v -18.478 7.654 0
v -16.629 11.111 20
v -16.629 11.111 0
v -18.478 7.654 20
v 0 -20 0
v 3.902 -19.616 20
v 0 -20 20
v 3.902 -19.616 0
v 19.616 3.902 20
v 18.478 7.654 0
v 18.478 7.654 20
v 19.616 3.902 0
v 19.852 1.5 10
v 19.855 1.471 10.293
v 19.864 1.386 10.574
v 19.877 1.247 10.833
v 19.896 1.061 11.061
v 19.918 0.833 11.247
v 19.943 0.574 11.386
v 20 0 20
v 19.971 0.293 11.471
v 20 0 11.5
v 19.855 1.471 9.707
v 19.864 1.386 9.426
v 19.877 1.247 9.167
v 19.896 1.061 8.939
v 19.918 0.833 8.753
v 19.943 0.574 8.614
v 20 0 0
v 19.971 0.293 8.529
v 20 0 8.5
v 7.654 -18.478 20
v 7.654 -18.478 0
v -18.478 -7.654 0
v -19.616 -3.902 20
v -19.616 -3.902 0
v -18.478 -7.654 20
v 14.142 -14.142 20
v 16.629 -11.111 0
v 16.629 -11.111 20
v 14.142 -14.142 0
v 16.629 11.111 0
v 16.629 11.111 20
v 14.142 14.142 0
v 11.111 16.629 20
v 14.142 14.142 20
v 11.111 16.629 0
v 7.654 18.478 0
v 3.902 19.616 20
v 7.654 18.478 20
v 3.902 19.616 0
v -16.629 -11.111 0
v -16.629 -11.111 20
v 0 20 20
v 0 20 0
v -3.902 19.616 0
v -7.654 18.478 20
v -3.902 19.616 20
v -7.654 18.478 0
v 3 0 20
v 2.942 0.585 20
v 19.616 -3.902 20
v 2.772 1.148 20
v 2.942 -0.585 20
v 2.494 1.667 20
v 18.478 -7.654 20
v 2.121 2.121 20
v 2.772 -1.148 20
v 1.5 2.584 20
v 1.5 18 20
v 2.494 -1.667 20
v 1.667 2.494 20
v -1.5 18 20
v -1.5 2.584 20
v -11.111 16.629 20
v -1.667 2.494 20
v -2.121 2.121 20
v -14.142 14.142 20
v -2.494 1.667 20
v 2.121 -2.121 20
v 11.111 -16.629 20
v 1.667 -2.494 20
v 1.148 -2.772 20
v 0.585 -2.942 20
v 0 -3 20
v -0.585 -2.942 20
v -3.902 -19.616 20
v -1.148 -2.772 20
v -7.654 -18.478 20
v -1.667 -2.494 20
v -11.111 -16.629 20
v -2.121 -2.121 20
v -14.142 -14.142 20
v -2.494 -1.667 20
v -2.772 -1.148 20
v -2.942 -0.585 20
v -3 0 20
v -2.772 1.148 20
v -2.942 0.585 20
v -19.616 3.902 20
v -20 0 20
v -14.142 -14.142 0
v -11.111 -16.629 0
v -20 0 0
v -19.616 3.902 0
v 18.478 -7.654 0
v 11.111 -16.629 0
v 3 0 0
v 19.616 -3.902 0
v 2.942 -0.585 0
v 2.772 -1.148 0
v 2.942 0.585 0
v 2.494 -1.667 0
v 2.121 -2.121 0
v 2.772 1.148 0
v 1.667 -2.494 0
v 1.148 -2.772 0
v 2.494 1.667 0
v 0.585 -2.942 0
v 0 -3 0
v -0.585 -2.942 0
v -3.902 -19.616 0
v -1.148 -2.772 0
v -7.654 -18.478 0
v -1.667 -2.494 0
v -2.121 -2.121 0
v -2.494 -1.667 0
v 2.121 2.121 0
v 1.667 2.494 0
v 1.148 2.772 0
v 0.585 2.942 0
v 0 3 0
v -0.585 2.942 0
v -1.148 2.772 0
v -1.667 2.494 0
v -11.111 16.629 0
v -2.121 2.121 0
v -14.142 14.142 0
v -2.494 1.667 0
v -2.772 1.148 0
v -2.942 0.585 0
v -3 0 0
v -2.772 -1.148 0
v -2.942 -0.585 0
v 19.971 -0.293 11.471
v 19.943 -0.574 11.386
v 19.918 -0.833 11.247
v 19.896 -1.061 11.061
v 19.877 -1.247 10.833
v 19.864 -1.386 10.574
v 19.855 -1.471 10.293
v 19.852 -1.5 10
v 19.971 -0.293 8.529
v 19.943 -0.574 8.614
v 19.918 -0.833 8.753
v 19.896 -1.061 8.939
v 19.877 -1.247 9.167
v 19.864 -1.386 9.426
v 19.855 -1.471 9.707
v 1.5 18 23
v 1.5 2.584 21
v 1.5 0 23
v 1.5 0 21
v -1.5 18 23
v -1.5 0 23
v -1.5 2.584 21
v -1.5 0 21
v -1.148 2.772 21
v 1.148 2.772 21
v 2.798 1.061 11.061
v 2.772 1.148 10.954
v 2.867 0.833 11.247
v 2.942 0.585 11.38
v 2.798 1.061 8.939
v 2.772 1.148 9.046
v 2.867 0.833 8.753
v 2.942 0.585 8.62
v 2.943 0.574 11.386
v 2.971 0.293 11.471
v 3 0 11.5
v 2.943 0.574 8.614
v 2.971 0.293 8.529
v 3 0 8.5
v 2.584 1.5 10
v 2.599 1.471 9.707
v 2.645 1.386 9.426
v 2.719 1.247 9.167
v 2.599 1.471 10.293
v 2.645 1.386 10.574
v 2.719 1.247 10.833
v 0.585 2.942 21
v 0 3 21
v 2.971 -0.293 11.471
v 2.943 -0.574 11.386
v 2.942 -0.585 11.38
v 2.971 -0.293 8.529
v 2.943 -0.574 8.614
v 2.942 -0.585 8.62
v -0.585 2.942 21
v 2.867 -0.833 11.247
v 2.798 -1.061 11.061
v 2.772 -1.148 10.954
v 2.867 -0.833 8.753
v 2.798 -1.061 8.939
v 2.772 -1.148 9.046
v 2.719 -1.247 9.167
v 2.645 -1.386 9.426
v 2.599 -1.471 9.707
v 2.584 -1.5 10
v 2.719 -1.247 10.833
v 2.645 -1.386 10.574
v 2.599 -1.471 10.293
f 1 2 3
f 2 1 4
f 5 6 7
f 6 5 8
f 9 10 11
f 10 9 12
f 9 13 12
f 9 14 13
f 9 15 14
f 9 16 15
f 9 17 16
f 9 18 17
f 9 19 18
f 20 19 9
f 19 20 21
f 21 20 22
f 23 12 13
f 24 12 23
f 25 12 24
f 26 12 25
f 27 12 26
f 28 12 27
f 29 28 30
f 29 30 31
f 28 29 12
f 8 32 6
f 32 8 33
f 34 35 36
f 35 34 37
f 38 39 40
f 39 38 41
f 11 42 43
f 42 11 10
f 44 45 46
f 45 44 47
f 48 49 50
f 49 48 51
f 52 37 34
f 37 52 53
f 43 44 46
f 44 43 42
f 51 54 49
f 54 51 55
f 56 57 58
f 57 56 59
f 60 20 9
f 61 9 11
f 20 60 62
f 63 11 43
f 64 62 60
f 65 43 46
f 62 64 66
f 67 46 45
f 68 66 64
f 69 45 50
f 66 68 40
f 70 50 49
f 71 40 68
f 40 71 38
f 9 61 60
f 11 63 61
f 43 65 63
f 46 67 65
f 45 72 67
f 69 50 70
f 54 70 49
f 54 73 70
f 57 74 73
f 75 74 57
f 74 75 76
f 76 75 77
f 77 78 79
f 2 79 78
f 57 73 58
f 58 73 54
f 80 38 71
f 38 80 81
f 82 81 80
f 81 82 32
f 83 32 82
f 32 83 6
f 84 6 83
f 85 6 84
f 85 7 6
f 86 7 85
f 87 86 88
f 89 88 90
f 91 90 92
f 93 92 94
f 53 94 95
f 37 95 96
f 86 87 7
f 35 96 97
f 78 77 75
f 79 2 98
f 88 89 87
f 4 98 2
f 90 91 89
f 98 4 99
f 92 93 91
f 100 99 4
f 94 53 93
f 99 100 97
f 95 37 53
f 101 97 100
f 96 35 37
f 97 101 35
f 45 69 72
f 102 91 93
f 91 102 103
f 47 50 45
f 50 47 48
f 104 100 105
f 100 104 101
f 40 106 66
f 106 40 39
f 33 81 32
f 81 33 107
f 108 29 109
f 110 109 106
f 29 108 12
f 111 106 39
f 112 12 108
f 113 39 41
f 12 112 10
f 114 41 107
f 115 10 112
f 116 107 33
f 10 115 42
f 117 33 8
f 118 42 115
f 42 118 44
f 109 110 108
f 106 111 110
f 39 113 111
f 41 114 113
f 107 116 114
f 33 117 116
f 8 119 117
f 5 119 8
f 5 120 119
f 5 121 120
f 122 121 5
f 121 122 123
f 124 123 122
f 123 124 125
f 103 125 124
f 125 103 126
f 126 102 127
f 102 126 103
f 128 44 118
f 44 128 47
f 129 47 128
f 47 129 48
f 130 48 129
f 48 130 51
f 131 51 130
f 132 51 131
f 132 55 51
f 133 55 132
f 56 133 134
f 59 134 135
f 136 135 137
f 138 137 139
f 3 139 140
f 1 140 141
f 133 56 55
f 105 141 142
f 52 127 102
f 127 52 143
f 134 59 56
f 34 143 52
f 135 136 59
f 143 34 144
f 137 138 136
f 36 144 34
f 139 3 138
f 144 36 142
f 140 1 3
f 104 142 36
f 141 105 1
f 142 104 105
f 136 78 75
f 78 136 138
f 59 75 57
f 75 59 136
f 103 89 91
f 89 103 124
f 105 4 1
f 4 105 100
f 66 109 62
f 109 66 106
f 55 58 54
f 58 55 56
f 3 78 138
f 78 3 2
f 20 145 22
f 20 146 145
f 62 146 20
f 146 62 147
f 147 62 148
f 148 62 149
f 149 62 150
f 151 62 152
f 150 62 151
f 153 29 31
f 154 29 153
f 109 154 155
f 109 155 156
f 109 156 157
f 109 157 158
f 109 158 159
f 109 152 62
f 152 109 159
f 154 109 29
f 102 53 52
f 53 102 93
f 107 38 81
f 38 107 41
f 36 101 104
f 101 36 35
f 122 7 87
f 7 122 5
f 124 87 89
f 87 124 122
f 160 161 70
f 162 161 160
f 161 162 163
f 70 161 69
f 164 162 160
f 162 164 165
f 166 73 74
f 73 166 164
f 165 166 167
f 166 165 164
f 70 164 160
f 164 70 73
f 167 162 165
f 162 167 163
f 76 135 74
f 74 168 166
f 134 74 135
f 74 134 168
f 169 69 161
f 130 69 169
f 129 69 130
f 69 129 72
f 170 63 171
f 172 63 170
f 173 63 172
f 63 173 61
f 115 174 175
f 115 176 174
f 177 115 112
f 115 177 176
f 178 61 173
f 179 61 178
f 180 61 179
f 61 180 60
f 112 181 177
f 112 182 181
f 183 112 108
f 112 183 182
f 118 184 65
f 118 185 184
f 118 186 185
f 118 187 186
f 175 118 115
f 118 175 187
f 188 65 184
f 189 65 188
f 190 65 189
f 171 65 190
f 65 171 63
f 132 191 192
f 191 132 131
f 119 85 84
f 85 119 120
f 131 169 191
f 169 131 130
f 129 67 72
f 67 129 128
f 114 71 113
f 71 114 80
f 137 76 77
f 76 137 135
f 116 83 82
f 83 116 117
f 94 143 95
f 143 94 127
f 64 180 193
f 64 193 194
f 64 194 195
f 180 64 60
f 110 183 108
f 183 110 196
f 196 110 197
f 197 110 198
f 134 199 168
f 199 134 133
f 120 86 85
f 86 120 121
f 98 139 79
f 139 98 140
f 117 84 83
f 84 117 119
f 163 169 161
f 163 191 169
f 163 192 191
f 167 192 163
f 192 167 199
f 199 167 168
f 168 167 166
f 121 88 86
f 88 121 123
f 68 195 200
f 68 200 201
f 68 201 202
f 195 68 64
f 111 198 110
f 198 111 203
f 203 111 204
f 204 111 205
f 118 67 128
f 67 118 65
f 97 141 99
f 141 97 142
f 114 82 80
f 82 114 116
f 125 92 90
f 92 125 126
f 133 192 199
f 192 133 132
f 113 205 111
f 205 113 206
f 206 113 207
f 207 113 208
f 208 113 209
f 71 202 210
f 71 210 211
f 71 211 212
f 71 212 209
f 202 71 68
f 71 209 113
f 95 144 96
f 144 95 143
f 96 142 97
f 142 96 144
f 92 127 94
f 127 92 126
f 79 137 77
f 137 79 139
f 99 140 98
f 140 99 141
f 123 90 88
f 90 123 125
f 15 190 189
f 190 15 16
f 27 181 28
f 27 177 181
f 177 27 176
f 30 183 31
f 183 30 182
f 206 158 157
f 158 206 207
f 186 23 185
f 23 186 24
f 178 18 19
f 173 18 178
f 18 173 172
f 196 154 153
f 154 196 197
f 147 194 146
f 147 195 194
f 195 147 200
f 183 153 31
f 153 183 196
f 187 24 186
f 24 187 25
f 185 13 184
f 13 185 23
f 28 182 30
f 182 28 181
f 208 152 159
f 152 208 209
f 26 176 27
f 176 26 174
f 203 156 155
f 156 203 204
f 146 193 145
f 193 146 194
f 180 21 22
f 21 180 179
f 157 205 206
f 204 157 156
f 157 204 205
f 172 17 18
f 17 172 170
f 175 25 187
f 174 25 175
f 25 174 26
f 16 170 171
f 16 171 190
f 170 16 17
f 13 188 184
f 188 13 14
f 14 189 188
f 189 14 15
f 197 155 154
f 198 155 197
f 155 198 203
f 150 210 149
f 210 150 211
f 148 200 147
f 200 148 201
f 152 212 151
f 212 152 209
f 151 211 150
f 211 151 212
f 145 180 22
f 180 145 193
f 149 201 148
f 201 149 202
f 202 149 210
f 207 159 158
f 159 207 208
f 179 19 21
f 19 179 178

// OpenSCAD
$fn = 32;

// ----------------------------------------------------------------------
// Control knob: pointer knob
// ----------------------------------------------------------------------

// --- parameters (mm) ---
rib_w = 3;                // pointer rib width
rib_h = 4;                // pointer rib height
knob_d = 40;              // knob body diameter
knob_h = 20;              // knob body height
bore_d = 6;               // shaft bore diameter
set_d = 3;                // set screw bore diameter

rib_poke = rib_h - 1;  // rib height above the top
total_h = knob_h + rib_h - 1;  // overall height

difference() {
  union() {
    cylinder(h = knob_h, d = knob_d);
    translate([-rib_w / 2, 0, knob_h - 1])
      cube([rib_w, knob_d / 2 - 2, rib_h]);
  }
  translate([0, 0, -1]) cylinder(h = knob_h + 2, d = bore_d);
  translate([-1, 0, knob_h / 2]) rotate([0, 90, 0])
    cylinder(h = knob_d / 2 + bore_d / 2 + 2, d = set_d);}
